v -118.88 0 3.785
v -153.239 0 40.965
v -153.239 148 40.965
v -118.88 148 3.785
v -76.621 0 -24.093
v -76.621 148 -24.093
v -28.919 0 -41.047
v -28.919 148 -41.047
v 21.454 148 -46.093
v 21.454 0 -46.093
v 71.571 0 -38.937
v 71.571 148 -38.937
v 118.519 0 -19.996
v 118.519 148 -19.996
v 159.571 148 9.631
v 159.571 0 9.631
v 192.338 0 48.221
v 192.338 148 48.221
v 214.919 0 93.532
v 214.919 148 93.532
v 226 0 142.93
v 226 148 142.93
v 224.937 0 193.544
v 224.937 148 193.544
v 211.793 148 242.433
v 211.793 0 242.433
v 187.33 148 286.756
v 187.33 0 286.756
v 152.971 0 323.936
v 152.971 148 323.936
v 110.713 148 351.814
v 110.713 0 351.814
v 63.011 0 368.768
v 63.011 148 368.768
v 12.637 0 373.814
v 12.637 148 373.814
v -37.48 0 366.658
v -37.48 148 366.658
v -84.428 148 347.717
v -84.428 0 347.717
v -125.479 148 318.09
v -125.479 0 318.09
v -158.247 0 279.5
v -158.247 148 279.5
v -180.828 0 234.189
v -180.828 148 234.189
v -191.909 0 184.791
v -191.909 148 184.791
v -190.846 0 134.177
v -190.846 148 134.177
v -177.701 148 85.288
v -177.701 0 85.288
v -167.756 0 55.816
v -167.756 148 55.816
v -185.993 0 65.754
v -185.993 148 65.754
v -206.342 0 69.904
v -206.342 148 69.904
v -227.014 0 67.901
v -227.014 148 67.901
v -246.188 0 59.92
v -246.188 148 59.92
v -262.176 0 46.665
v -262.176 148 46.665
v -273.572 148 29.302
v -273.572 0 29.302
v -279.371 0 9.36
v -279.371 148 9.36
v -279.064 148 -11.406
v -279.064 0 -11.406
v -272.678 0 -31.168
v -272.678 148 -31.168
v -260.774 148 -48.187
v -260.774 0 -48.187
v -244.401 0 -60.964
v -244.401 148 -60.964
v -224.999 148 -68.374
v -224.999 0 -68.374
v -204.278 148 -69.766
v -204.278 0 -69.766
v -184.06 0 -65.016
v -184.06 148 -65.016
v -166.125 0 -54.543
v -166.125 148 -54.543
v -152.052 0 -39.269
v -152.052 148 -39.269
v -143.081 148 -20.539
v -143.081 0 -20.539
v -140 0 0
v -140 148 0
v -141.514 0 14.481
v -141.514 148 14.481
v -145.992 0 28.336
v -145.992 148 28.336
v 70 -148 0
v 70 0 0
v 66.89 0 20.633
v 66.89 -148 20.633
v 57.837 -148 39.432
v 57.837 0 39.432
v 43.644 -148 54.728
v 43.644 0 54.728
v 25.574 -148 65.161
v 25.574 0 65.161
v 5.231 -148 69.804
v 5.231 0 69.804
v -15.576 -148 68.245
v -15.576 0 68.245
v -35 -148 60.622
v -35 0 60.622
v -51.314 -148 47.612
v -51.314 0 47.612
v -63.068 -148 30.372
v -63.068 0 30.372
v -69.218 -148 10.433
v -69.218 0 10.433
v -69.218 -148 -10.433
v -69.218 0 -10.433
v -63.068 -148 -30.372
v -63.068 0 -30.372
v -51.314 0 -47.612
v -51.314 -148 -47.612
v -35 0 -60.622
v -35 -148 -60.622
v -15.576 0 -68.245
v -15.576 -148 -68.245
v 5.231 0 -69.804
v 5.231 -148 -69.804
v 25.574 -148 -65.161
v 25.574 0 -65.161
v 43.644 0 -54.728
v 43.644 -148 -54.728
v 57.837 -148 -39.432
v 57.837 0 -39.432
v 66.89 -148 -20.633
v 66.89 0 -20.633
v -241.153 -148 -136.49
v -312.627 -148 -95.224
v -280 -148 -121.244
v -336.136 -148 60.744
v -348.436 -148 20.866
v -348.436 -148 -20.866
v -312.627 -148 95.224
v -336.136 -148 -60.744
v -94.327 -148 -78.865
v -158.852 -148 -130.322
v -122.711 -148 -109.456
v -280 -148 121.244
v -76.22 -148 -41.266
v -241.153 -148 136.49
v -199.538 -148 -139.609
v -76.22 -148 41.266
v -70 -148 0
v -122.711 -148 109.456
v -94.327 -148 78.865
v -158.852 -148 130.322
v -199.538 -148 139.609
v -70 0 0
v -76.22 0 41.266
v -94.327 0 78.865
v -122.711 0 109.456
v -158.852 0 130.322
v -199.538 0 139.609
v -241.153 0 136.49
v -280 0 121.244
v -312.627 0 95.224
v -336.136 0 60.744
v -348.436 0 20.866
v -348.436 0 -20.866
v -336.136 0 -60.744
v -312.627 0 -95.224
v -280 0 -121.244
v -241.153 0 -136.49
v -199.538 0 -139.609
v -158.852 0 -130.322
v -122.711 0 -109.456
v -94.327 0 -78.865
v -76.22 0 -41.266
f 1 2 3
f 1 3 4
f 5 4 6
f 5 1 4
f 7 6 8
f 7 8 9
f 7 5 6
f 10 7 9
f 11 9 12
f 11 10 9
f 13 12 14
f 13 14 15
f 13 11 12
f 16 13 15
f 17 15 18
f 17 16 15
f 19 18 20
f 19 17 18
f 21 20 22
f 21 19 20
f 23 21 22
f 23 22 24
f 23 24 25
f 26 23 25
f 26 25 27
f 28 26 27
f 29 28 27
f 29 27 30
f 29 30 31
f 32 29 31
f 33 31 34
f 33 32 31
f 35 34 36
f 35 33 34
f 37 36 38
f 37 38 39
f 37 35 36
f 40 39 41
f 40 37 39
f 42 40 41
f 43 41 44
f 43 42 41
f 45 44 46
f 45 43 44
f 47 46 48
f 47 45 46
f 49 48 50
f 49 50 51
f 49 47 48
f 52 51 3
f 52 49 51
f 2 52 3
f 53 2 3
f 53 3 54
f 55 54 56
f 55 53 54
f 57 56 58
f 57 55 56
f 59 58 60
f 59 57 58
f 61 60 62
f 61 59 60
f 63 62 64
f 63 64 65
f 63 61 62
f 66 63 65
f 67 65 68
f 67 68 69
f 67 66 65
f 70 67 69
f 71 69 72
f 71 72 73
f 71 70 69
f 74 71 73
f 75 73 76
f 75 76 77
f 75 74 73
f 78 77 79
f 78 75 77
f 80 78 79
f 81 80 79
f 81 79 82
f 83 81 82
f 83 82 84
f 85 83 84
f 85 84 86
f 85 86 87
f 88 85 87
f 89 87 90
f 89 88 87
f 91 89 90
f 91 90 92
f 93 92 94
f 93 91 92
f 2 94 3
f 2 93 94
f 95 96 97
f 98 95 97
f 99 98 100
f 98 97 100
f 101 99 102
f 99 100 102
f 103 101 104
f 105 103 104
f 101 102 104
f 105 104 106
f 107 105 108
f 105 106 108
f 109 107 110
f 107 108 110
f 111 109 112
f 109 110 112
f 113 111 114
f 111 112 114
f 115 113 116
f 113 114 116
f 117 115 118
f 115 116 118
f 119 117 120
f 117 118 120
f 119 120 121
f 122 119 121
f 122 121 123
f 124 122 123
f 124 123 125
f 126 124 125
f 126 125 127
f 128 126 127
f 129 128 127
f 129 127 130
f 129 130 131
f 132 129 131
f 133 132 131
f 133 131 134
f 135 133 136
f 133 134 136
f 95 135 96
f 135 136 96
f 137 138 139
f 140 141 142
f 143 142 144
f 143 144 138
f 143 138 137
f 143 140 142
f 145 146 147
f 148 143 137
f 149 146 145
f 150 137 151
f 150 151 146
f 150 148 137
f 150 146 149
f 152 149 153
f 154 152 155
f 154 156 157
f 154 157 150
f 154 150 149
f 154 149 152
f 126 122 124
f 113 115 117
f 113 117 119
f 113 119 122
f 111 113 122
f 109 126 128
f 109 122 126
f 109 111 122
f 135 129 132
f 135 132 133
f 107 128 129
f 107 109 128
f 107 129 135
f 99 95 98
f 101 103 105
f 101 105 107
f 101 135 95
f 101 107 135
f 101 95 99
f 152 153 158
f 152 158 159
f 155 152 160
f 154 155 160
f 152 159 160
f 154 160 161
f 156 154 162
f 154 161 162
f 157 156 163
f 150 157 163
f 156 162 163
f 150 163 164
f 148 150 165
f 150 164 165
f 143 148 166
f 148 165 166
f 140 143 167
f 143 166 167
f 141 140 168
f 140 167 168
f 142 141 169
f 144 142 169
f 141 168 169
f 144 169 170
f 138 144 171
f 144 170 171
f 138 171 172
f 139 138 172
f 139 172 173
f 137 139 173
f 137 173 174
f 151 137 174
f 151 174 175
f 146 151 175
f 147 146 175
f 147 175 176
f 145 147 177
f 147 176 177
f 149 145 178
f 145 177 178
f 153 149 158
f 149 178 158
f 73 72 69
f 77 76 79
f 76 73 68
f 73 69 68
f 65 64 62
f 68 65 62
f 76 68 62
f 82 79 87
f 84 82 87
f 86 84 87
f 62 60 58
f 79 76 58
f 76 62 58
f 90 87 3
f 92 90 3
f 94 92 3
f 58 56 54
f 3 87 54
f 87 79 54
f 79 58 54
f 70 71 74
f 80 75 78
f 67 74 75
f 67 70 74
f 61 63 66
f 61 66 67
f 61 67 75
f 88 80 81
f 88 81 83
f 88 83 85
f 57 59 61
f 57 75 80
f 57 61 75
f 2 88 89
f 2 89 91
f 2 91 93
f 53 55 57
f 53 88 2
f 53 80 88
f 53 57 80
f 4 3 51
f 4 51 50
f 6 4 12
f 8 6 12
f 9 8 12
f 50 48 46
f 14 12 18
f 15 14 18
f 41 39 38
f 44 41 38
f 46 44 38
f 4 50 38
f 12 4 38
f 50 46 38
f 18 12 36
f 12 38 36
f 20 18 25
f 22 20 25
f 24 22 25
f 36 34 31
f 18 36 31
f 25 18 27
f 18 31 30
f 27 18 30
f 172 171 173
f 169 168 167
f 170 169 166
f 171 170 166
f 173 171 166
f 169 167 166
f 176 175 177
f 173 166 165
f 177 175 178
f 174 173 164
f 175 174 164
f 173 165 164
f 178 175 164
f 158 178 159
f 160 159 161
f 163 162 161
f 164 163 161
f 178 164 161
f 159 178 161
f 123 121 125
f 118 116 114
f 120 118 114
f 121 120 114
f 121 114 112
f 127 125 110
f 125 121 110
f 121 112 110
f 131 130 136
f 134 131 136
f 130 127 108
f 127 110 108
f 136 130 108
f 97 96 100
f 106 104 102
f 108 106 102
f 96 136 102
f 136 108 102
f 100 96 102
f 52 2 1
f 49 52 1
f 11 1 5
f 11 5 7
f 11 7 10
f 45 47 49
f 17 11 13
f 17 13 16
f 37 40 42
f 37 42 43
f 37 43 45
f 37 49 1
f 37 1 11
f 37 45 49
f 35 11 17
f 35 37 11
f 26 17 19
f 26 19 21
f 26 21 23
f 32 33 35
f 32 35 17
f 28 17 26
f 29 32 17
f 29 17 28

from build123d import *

# Parameters (mm, degrees)
F0_R     = 70
F1_DEPTH = 148
F2_R     = 140
F3_DEPTH = 148
F5_DEPTH = 148


# Not quite as in the source:
# - a feature of the source that left no trace in its solid (it failed there, or was rolled back) is left out


with BuildPart() as f1:
    # F0 (on Front) → F1 (new body)
    with BuildSketch(Plane.XZ):
        Circle(F0_R)
    extrude(amount=F1_DEPTH)


with BuildPart() as f3:
    # F2 (on Front) → F3 (new body)
    with BuildSketch(Plane.XZ):
        with Locations((-210, 0)):
            Circle(F2_R)
    extrude(amount=F3_DEPTH)


with BuildPart() as f5:
    # F4 (on Front) → F5 (new body)
    with BuildSketch(Plane.XZ):
        with BuildLine():
            ThreePointArc((-153.2385760506, 40.9651162727), (-276.6081814662, -21.5255699523), (-140, 0))
            ThreePointArc((-140, 0), (-143.3918185338, 21.5255699523), (-153.2385760506, 40.9651162727))
        make_face()
    extrude(amount=-F5_DEPTH)


with BuildPart() as f5b:
    # F4 (on Front) → F5, piece 2 (new body)
    with BuildSketch(Plane.XZ):
        with BuildLine():
            ThreePointArc((227.0456952089, 163.8604659066), (-47.5310151267, 363.6850101504), (-153.2385760506, 40.9651162727))
            ThreePointArc((-153.2385760506, 40.9651162727), (81.6224055444, -35.9640783372), (227.0456952089, 163.8604659066))
        make_face()
    extrude(amount=-F5_DEPTH)


solid = Compound([f1.part, f3.part, f5.part, f5b.part])
